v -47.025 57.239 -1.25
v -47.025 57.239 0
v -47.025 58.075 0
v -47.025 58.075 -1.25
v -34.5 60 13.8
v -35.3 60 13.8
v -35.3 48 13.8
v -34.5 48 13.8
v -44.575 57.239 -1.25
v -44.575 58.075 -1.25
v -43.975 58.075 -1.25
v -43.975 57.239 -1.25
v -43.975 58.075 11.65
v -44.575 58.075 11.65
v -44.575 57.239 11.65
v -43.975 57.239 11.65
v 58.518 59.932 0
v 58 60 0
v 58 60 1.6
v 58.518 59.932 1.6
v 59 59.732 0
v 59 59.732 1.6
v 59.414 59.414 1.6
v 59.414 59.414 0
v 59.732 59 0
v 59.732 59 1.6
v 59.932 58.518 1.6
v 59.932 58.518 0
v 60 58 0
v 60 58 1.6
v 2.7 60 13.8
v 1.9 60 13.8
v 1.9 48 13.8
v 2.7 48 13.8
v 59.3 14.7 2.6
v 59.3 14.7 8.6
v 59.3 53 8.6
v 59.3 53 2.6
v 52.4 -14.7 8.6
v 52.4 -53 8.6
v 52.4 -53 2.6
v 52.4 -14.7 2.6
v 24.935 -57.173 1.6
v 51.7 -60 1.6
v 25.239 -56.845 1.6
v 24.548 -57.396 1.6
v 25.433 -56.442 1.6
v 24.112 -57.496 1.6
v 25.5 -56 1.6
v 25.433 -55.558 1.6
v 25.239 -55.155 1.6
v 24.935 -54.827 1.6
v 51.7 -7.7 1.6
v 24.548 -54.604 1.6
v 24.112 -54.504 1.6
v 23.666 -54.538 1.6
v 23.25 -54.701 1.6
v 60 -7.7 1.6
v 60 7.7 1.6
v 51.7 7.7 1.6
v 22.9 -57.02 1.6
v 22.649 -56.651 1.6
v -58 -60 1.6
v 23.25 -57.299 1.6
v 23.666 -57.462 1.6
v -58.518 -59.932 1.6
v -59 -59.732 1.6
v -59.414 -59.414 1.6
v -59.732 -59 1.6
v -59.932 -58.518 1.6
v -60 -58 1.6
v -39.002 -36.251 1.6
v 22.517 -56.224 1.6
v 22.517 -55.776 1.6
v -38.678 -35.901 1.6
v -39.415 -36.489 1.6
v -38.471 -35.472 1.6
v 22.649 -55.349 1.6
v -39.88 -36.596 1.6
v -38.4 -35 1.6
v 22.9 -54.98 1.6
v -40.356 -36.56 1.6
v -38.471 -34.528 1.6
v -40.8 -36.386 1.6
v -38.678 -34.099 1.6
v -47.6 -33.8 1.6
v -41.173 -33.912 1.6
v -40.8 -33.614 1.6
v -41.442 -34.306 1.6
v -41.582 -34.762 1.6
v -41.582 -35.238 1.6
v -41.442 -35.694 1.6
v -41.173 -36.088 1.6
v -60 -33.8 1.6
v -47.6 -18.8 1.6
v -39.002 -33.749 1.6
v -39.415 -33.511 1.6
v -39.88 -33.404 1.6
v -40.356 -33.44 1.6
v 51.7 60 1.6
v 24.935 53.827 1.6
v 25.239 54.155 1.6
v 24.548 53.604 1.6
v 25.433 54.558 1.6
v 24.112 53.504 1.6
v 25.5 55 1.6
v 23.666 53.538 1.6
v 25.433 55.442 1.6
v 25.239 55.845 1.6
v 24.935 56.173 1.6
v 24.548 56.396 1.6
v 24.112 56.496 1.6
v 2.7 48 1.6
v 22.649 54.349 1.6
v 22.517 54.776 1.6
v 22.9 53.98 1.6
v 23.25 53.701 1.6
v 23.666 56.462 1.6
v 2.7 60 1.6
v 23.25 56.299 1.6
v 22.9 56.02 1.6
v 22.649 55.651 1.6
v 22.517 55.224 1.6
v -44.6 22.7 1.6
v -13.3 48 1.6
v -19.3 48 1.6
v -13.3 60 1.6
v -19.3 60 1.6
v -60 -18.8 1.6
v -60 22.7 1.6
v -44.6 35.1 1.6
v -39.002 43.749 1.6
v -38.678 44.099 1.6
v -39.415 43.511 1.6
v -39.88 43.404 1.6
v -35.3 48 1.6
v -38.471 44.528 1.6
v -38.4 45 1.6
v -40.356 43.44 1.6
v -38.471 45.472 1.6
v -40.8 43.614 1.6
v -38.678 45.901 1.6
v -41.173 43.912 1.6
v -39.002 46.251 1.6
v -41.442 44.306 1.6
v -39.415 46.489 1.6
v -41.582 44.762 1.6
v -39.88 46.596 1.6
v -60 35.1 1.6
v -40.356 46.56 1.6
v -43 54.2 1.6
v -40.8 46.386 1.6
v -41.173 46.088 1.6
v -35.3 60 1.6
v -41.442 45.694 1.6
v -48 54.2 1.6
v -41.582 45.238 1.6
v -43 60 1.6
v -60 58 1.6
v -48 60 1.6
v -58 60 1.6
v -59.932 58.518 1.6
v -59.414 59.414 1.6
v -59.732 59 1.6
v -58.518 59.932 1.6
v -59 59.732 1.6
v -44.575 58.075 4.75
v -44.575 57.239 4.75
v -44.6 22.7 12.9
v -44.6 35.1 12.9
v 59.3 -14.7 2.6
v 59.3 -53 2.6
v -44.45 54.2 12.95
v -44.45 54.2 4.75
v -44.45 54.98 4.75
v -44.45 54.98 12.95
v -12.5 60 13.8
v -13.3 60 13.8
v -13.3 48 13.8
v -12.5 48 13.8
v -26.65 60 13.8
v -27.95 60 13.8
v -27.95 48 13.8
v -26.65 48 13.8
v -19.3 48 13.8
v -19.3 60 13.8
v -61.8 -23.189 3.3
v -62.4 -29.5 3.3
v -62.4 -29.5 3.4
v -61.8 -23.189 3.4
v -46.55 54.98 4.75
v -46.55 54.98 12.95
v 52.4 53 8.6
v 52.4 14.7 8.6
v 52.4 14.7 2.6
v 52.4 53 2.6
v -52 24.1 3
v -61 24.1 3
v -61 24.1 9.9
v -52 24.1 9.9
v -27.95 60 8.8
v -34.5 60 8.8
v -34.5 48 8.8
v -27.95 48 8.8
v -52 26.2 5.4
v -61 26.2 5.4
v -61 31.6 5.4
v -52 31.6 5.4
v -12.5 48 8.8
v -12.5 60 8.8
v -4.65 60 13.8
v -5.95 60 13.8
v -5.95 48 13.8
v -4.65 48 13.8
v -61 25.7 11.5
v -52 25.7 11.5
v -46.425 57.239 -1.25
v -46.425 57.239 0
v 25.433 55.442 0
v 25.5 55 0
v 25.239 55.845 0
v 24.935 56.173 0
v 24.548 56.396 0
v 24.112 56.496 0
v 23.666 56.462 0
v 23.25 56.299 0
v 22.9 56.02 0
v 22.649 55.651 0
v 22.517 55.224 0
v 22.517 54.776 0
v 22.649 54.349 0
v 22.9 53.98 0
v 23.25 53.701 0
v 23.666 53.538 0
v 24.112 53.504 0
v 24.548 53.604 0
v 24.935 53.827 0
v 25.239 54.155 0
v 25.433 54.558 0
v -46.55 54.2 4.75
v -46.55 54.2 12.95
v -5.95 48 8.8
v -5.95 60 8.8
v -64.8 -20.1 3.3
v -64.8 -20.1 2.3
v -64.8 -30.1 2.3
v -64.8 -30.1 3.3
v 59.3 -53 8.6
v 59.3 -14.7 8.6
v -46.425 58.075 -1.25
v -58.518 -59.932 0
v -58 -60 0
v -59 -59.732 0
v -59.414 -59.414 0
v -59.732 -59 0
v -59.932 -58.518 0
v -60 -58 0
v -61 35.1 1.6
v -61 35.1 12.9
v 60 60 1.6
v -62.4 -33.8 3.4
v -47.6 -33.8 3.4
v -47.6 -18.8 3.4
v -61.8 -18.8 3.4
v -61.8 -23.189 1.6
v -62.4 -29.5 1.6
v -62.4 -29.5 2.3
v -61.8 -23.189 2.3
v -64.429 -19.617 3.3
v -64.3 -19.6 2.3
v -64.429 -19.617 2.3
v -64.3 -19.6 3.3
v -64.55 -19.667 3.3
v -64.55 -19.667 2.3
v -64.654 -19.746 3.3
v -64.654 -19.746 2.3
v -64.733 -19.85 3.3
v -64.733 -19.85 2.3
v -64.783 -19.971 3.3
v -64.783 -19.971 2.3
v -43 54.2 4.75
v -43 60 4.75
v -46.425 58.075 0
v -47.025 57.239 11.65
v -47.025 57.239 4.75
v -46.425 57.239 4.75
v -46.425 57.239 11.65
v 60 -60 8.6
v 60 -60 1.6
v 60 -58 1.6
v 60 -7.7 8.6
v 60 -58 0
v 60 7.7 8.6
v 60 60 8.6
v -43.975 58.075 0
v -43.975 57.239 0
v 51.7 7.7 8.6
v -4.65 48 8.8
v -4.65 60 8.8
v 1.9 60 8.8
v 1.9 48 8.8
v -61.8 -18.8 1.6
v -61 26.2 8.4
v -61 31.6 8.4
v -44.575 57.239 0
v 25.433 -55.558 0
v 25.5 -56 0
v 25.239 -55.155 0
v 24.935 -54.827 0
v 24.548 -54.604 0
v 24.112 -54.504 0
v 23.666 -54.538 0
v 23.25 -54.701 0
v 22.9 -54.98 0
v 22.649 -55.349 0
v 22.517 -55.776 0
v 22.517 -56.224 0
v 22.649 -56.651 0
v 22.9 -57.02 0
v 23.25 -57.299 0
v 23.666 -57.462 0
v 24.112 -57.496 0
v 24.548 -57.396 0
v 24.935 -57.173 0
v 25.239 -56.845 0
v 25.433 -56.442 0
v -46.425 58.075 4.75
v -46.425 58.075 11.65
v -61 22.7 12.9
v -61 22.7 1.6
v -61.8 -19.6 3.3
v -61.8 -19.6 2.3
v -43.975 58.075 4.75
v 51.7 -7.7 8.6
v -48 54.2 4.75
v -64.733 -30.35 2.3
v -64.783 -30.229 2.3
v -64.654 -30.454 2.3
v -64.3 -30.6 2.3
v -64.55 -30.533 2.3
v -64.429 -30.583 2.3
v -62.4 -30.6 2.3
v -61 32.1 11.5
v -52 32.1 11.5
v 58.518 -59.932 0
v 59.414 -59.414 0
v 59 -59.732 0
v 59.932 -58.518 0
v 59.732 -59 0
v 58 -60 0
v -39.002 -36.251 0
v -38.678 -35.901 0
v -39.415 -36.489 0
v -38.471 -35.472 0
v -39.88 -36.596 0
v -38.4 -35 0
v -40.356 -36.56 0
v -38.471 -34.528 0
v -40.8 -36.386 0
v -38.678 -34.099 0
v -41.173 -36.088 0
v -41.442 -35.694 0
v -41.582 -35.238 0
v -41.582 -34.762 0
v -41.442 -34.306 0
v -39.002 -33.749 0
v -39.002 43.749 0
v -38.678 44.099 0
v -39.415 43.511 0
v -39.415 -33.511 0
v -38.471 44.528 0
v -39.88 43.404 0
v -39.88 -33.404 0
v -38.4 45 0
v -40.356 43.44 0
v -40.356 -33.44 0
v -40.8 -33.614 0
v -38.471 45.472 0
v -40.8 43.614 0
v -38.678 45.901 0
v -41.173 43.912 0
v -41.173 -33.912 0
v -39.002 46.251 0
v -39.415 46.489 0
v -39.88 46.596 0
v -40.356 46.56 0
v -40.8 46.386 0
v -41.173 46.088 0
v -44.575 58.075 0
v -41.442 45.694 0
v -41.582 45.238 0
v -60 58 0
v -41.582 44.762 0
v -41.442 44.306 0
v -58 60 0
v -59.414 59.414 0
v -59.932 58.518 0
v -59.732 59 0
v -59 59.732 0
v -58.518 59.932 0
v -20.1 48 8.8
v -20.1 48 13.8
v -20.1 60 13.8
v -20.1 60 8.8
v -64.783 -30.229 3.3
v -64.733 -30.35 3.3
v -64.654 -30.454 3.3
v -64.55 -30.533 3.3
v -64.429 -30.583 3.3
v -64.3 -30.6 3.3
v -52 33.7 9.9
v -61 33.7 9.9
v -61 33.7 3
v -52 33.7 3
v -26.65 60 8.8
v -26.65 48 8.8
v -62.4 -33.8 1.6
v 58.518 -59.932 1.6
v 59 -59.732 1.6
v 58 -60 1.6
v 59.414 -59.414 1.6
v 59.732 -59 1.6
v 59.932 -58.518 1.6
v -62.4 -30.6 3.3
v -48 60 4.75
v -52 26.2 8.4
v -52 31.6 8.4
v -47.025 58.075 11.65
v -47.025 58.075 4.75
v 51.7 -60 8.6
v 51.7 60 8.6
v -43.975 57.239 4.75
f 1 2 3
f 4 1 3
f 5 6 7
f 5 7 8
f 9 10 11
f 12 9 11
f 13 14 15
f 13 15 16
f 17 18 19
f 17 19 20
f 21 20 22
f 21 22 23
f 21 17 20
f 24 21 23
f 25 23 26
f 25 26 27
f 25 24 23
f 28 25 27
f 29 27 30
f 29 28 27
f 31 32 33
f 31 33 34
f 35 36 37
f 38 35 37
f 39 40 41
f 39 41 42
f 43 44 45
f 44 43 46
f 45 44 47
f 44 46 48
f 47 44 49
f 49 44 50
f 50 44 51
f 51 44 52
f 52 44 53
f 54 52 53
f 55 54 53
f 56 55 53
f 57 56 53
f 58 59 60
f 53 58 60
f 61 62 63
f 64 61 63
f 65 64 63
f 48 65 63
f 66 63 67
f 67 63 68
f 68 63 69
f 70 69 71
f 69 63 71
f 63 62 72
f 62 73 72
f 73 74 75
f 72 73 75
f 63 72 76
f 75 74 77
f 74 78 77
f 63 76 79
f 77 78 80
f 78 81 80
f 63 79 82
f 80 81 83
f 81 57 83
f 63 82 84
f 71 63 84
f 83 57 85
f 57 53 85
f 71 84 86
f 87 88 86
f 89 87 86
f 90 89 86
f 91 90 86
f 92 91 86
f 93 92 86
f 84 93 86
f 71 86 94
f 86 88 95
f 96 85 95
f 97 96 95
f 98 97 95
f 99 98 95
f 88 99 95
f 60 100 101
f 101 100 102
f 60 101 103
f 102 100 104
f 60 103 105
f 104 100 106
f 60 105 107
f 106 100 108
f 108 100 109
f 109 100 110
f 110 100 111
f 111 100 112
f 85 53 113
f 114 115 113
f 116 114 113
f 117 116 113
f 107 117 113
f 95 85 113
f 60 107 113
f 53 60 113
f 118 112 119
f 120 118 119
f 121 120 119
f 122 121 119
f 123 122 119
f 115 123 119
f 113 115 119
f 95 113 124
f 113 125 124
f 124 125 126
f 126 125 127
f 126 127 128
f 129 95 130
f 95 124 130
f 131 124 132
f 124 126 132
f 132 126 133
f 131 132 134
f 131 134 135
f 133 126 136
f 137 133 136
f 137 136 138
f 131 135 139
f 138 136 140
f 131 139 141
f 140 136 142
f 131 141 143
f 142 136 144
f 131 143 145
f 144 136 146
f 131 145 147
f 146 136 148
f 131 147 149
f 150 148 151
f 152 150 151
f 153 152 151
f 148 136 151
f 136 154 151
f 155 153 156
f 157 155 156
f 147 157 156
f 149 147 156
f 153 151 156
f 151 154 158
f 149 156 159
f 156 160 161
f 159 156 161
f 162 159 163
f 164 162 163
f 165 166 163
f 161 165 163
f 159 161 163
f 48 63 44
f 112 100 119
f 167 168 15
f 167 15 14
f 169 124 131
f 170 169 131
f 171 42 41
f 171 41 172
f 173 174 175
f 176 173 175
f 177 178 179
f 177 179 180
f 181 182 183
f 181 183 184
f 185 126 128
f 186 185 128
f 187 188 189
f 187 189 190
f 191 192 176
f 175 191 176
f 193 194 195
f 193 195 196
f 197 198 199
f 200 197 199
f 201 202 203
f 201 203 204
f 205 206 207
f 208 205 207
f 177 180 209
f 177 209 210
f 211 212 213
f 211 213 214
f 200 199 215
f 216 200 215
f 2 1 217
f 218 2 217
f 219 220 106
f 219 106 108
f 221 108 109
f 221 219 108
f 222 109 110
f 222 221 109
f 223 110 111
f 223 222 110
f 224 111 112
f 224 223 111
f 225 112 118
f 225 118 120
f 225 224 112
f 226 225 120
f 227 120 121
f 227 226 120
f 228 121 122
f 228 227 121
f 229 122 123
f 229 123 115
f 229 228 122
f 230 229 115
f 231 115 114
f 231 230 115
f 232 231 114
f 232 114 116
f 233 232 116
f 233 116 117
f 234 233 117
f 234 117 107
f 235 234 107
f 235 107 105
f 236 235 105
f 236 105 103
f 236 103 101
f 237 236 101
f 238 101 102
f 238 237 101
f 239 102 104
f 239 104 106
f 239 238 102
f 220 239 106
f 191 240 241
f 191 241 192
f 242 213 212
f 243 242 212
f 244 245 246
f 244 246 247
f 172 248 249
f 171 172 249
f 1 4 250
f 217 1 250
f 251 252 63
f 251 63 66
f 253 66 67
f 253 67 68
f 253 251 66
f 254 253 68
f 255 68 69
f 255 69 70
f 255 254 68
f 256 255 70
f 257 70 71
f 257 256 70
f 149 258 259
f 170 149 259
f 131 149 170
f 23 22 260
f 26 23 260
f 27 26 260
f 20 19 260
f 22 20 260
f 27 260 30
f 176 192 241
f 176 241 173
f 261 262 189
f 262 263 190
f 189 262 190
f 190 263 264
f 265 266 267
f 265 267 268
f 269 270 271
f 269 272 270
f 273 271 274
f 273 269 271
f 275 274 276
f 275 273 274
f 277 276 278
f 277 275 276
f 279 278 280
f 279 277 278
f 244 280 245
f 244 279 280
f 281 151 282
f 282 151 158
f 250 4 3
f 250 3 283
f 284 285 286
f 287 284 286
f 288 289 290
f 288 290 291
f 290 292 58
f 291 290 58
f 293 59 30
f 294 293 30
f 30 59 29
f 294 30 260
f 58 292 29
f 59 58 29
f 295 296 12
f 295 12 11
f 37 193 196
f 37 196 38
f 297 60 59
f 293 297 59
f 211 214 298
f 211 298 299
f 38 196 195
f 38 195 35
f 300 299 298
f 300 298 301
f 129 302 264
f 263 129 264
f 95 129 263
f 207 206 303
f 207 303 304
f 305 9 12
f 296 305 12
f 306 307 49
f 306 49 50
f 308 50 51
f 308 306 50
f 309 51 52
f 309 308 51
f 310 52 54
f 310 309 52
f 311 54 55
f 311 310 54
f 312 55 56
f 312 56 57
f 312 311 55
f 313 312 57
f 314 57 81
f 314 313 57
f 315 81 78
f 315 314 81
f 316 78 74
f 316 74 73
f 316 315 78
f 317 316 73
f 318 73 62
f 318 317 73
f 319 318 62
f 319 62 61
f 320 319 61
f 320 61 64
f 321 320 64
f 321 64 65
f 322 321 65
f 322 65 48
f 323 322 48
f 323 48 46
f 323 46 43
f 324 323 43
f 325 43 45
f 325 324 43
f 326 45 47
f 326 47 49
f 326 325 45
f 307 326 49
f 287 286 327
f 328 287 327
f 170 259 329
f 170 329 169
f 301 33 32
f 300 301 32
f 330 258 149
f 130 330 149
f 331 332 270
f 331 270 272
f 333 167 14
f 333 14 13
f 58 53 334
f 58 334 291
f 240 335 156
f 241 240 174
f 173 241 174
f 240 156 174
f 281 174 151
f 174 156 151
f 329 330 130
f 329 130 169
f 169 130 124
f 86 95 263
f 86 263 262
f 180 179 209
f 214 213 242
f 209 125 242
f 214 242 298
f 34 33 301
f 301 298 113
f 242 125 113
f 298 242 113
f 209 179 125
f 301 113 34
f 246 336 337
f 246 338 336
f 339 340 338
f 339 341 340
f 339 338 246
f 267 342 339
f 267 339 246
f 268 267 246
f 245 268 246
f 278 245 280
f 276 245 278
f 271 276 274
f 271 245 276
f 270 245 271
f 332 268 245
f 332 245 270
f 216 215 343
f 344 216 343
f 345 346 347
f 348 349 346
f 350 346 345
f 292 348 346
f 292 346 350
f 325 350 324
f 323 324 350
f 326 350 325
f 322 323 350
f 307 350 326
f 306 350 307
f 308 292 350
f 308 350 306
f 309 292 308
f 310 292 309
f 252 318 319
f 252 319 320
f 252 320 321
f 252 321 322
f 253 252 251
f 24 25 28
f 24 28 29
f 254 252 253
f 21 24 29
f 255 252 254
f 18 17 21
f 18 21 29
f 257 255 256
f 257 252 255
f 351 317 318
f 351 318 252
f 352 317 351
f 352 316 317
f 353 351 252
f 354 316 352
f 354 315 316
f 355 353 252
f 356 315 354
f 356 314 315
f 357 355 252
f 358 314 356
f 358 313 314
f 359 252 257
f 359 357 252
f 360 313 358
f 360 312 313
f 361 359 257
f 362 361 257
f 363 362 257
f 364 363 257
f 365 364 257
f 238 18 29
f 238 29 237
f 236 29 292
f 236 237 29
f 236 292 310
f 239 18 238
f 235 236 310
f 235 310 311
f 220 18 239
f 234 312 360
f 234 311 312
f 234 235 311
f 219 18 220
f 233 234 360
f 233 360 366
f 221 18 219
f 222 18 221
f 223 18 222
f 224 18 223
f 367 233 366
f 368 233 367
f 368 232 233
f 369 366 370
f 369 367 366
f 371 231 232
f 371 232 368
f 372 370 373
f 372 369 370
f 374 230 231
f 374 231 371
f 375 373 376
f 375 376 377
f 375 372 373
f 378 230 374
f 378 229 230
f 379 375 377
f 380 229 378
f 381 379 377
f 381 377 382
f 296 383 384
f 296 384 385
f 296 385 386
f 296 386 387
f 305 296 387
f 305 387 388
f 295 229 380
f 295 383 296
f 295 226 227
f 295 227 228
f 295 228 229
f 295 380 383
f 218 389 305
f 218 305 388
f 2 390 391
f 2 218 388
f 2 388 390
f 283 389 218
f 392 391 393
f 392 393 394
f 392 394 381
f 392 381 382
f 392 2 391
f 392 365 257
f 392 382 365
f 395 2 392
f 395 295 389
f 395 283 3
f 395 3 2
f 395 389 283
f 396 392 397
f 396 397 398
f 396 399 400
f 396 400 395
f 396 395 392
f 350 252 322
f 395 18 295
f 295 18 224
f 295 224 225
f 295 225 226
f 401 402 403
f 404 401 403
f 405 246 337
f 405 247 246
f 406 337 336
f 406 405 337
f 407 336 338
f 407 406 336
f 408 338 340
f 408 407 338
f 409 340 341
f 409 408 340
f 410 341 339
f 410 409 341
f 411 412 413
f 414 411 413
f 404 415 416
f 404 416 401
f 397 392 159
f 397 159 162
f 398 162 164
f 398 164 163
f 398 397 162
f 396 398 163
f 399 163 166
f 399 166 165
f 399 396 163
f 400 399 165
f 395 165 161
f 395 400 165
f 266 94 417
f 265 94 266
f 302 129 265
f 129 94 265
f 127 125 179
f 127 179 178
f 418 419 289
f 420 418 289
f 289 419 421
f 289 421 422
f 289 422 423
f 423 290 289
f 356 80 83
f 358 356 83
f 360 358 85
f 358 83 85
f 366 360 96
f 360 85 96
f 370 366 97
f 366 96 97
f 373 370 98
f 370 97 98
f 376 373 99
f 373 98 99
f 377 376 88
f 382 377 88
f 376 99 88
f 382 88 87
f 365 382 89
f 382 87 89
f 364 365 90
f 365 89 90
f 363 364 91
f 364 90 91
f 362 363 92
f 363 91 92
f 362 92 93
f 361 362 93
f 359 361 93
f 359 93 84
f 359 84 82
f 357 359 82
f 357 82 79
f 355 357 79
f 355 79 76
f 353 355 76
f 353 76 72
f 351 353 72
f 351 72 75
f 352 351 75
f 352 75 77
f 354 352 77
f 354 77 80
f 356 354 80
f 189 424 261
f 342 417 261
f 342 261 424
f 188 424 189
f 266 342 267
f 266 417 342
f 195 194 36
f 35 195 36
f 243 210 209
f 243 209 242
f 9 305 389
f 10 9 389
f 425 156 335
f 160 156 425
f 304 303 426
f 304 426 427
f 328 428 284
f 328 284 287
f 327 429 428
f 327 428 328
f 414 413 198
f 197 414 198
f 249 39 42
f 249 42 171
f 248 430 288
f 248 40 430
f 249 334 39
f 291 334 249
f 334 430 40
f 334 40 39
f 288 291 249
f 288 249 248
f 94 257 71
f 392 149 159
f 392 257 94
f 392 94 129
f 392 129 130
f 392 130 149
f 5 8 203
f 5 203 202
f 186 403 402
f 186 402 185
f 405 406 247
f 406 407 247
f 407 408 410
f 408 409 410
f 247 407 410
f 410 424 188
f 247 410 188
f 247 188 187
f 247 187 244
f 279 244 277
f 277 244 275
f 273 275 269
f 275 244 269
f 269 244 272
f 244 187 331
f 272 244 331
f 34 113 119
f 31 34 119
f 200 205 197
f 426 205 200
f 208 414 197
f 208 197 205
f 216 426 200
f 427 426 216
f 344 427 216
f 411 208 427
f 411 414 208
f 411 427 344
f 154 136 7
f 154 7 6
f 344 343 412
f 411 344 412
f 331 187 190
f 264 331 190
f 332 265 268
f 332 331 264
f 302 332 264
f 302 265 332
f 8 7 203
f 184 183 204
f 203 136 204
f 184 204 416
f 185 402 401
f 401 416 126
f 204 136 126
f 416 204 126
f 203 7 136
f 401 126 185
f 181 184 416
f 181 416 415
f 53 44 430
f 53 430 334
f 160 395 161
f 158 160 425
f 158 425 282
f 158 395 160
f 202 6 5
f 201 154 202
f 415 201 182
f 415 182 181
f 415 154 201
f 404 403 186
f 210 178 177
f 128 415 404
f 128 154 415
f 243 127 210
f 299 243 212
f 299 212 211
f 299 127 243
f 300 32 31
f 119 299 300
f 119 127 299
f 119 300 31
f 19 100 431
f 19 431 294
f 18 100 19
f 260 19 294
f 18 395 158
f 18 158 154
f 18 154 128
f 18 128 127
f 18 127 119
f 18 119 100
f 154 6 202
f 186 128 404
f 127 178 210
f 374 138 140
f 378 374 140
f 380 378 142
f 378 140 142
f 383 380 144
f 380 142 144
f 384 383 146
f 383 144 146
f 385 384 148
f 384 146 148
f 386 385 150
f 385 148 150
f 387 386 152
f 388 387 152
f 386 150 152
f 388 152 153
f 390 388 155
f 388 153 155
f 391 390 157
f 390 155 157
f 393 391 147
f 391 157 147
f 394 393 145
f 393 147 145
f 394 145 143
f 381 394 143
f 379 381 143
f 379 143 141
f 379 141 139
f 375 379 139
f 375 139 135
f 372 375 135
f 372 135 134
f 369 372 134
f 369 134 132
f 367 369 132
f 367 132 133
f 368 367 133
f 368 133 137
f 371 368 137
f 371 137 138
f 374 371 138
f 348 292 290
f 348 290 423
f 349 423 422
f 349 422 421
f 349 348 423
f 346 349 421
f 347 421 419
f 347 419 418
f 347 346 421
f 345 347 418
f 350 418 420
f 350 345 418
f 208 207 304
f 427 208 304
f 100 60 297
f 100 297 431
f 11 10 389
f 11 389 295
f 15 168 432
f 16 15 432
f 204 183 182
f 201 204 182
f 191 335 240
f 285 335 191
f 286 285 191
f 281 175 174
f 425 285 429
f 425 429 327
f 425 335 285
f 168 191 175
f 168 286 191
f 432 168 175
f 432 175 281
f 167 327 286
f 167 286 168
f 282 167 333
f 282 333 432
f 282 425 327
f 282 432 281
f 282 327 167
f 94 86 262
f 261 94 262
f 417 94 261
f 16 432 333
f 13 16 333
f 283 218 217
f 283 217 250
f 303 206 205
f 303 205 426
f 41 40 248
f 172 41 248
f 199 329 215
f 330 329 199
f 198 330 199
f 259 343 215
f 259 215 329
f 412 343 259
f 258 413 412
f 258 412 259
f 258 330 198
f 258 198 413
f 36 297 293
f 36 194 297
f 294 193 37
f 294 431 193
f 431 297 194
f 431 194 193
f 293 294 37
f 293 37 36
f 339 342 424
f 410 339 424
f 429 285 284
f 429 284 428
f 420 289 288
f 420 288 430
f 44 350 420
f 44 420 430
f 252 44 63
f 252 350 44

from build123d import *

# Parameters (mm, degrees)
SKETCH_1_R             = 1.5
EXTRUDE_1_DEPTH        = 1.6
SKETCH_2_W             = 16.4
SKETCH_2_H             = 12.4
EXTRUDE_2_DEPTH        = 11.3
SKETCH_3_W             = 3
SKETCH_3_H             = 5.4
CUT_EXTRUDE_1_DEPTH    = 9
EXTRUDE_3_DEPTH        = 1.8
SKETCH_5_W             = 1
SKETCH_5_H             = 11
EXTRUDE_4_DEPTH        = 3
FILLET_1_R             = 0.5
SKETCH_43_W            = 8.3
SKETCH_43_H            = 52.3
EXTRUDE_15_DEPTH       = 7
SKETCH_45_W            = 6.9
SKETCH_45_H            = 38.3
CUT_EXTRUDE_12_DEPTH   = 6
SKETCH_53_W            = 16
SKETCH_53_H            = 12
EXTRUDE_20_DEPTH       = 12.2
SKETCH_54_W            = 6.55
SKETCH_54_H            = 12
CUT_EXTRUDE_14_DEPTH   = 5
SKETCH_59_R            = 1.6
CUT_EXTRUDE_16_DEPTH   = 10
PATTERN_LINEAR_4_COUNT = 2
PATTERN_LINEAR_4_PITCH = 22
SKETCH_60_W            = 5
SKETCH_60_H            = 5.8
EXTRUDE_21_DEPTH       = 3.15
SKETCH_61_W            = 2.1
SKETCH_61_H            = 0.78
EXTRUDE_22_DEPTH       = 8.2
EXTRUDE_23_DEPTH       = 6.9
EXTRUDE_23_DEPTH_BACK  = 6
SKETCH_62_W            = 0.6
SKETCH_62_H            = 0.835930121


with BuildPart() as part:
    # 草图1 → 凸台-拉伸1 (new body)
    with BuildSketch(Plane.XY):
        with BuildLine():
            Line((58, -60), (-58, -60))
            ThreePointArc((-58, -60), (-59.414213562, -59.414213562), (-60, -58))
            Line((-60, -58), (-60, 58))
            ThreePointArc((-60, 58), (-59.414213562, 59.414213562), (-58, 60))
            Line((-58, 60), (58, 60))
            ThreePointArc((58, 60), (59.414213562, 59.414213562), (60, 58))
            Line((60, 58), (60, -58))
            ThreePointArc((60, -58), (59.414213562, -59.414213562), (58, -60))
        make_face()
        with Locations((24, 55)):
            Circle(SKETCH_1_R, mode=Mode.SUBTRACT)
        with Locations((24, -56)):
            Circle(SKETCH_1_R, mode=Mode.SUBTRACT)
    extrude(amount=EXTRUDE_1_DEPTH)

    # 草图2 → 凸台-拉伸2 (add)
    with BuildSketch(Plane.XY.offset(1.6)):
        with Locations((-52.8, 28.9)):
            Rectangle(SKETCH_2_W, SKETCH_2_H)
    extrude(amount=EXTRUDE_2_DEPTH)

    # 草图3 → 切除-拉伸1 (cut)
    with BuildSketch(Plane.ZY.offset(61)):
        Polygon((3, 33.7), (3, 24.1), (9.9, 24.1), (11.5, 25.7), (11.5, 32.1), (9.9, 33.7), align=None)
        with Locations((6.9, 28.9)):
            Rectangle(SKETCH_3_W, SKETCH_3_H, mode=Mode.SUBTRACT)
    extrude(amount=-CUT_EXTRUDE_1_DEPTH, mode=Mode.SUBTRACT)

    # 草图4 → 凸台-拉伸3 (add)
    with BuildSketch(Plane.XY.offset(1.6)):
        Polygon((-47.6, -18.8), (-47.6, -33.8), (-62.4, -33.8), (-62.4, -29.5), (-61.8, -23.188583942), (-61.8, -18.8), align=None)
    extrude(amount=EXTRUDE_3_DEPTH)

    # 草图5 → 凸台-拉伸4 (add)
    with BuildSketch(Plane.ZY.offset(61.8)):
        with Locations((2.8, -25.1)):
            Rectangle(SKETCH_5_W, SKETCH_5_H)
    extrude(amount=EXTRUDE_4_DEPTH)

    # 圆角1
    fillet_1_edges = [part.edges().sort_by_distance(p)[0] for p in [
        (-64.8, -19.6, 2.8),
        (-64.8, -30.6, 2.8),
    ]]
    fillet(fillet_1_edges, radius=FILLET_1_R)

    # 草图43 → 凸台-拉伸15 (add)
    with BuildSketch(Plane(origin=(66.890855613, 85.562649537, 1.6), x_dir=(1, 0, 0), z_dir=(0, 0, 1))):
        with Locations((-11.040855613, -51.712649537)):
            Rectangle(SKETCH_43_W, SKETCH_43_H)
        with Locations((-11.040855613, -119.412649537)):
            Rectangle(SKETCH_43_W, SKETCH_43_H)
    extrude(amount=EXTRUDE_15_DEPTH)

    # 草图45 → 切除-拉伸12 (cut)
    with BuildSketch(Plane(origin=(66.890855613, 85.562649537, 8.6), x_dir=(1, 0, 0), z_dir=(0, 0, 1))):
        with Locations((-11.040855613, -51.712649537)):
            Rectangle(SKETCH_45_W, SKETCH_45_H)
        with Locations((-11.040855613, -119.412649537)):
            Rectangle(SKETCH_45_W, SKETCH_45_H)
    extrude(amount=-CUT_EXTRUDE_12_DEPTH, mode=Mode.SUBTRACT)

    # 草图53 → 凸台-拉伸20 (add)
    with BuildSketch(Plane.XY.offset(1.6)):
        with Locations((-5.3, 54)):
            Rectangle(SKETCH_53_W, SKETCH_53_H)
    extrude_20 = extrude(amount=EXTRUDE_20_DEPTH)

    # 草图54 → 切除-拉伸14 (cut)
    with BuildSketch(Plane.XY.offset(13.8)):
        with Locations((-9.225, 54)):
            Rectangle(SKETCH_54_W, SKETCH_54_H)
        with Locations((-1.375, 54)):
            Rectangle(SKETCH_54_W, SKETCH_54_H)
    cut_extrude_14 = extrude(amount=-CUT_EXTRUDE_14_DEPTH, mode=Mode.SUBTRACT)

    # 草图59 → 切除-拉伸16 (cut)
    with BuildSketch(Plane.XY.offset(1.6)):
        with Locations((-40, -35)):
            Circle(SKETCH_59_R)
        with Locations((-40, 45)):
            Circle(SKETCH_59_R)
    extrude(amount=-CUT_EXTRUDE_16_DEPTH, mode=Mode.SUBTRACT)

    # 阵列(线性)4: 凸台-拉伸20, 切除-拉伸14 ×2
    with Locations(*[(-i * PATTERN_LINEAR_4_PITCH, 0, 0) for i in range(1, PATTERN_LINEAR_4_COUNT)]):
        add(extrude_20)
        add(cut_extrude_14, mode=Mode.SUBTRACT)

    # 草图60 → 凸台-拉伸21 (add)
    with BuildSketch(Plane.XY.offset(1.6)):
        with Locations((-45.5, 57.1)):
            Rectangle(SKETCH_60_W, SKETCH_60_H)
    extrude(amount=EXTRUDE_21_DEPTH)

    # 草图61 → 凸台-拉伸22 (add)
    with BuildSketch(Plane.XY.offset(4.75)):
        with Locations((-45.5, 54.59)):
            Rectangle(SKETCH_61_W, SKETCH_61_H)
    extrude(amount=EXTRUDE_22_DEPTH)

    # 草图62 → 凸台-拉伸23 (add, two sides: drawn at the far end of the back side and taken through both)
    with BuildSketch(Plane.XY.offset(4.75).offset(-EXTRUDE_23_DEPTH_BACK)):
        with Locations((-44.275, 57.657035773)):
            Rectangle(SKETCH_62_W, SKETCH_62_H)
        with Locations((-46.725, 57.657035773)):
            Rectangle(SKETCH_62_W, SKETCH_62_H)
    extrude(amount=EXTRUDE_23_DEPTH + EXTRUDE_23_DEPTH_BACK)


solid = part.part
